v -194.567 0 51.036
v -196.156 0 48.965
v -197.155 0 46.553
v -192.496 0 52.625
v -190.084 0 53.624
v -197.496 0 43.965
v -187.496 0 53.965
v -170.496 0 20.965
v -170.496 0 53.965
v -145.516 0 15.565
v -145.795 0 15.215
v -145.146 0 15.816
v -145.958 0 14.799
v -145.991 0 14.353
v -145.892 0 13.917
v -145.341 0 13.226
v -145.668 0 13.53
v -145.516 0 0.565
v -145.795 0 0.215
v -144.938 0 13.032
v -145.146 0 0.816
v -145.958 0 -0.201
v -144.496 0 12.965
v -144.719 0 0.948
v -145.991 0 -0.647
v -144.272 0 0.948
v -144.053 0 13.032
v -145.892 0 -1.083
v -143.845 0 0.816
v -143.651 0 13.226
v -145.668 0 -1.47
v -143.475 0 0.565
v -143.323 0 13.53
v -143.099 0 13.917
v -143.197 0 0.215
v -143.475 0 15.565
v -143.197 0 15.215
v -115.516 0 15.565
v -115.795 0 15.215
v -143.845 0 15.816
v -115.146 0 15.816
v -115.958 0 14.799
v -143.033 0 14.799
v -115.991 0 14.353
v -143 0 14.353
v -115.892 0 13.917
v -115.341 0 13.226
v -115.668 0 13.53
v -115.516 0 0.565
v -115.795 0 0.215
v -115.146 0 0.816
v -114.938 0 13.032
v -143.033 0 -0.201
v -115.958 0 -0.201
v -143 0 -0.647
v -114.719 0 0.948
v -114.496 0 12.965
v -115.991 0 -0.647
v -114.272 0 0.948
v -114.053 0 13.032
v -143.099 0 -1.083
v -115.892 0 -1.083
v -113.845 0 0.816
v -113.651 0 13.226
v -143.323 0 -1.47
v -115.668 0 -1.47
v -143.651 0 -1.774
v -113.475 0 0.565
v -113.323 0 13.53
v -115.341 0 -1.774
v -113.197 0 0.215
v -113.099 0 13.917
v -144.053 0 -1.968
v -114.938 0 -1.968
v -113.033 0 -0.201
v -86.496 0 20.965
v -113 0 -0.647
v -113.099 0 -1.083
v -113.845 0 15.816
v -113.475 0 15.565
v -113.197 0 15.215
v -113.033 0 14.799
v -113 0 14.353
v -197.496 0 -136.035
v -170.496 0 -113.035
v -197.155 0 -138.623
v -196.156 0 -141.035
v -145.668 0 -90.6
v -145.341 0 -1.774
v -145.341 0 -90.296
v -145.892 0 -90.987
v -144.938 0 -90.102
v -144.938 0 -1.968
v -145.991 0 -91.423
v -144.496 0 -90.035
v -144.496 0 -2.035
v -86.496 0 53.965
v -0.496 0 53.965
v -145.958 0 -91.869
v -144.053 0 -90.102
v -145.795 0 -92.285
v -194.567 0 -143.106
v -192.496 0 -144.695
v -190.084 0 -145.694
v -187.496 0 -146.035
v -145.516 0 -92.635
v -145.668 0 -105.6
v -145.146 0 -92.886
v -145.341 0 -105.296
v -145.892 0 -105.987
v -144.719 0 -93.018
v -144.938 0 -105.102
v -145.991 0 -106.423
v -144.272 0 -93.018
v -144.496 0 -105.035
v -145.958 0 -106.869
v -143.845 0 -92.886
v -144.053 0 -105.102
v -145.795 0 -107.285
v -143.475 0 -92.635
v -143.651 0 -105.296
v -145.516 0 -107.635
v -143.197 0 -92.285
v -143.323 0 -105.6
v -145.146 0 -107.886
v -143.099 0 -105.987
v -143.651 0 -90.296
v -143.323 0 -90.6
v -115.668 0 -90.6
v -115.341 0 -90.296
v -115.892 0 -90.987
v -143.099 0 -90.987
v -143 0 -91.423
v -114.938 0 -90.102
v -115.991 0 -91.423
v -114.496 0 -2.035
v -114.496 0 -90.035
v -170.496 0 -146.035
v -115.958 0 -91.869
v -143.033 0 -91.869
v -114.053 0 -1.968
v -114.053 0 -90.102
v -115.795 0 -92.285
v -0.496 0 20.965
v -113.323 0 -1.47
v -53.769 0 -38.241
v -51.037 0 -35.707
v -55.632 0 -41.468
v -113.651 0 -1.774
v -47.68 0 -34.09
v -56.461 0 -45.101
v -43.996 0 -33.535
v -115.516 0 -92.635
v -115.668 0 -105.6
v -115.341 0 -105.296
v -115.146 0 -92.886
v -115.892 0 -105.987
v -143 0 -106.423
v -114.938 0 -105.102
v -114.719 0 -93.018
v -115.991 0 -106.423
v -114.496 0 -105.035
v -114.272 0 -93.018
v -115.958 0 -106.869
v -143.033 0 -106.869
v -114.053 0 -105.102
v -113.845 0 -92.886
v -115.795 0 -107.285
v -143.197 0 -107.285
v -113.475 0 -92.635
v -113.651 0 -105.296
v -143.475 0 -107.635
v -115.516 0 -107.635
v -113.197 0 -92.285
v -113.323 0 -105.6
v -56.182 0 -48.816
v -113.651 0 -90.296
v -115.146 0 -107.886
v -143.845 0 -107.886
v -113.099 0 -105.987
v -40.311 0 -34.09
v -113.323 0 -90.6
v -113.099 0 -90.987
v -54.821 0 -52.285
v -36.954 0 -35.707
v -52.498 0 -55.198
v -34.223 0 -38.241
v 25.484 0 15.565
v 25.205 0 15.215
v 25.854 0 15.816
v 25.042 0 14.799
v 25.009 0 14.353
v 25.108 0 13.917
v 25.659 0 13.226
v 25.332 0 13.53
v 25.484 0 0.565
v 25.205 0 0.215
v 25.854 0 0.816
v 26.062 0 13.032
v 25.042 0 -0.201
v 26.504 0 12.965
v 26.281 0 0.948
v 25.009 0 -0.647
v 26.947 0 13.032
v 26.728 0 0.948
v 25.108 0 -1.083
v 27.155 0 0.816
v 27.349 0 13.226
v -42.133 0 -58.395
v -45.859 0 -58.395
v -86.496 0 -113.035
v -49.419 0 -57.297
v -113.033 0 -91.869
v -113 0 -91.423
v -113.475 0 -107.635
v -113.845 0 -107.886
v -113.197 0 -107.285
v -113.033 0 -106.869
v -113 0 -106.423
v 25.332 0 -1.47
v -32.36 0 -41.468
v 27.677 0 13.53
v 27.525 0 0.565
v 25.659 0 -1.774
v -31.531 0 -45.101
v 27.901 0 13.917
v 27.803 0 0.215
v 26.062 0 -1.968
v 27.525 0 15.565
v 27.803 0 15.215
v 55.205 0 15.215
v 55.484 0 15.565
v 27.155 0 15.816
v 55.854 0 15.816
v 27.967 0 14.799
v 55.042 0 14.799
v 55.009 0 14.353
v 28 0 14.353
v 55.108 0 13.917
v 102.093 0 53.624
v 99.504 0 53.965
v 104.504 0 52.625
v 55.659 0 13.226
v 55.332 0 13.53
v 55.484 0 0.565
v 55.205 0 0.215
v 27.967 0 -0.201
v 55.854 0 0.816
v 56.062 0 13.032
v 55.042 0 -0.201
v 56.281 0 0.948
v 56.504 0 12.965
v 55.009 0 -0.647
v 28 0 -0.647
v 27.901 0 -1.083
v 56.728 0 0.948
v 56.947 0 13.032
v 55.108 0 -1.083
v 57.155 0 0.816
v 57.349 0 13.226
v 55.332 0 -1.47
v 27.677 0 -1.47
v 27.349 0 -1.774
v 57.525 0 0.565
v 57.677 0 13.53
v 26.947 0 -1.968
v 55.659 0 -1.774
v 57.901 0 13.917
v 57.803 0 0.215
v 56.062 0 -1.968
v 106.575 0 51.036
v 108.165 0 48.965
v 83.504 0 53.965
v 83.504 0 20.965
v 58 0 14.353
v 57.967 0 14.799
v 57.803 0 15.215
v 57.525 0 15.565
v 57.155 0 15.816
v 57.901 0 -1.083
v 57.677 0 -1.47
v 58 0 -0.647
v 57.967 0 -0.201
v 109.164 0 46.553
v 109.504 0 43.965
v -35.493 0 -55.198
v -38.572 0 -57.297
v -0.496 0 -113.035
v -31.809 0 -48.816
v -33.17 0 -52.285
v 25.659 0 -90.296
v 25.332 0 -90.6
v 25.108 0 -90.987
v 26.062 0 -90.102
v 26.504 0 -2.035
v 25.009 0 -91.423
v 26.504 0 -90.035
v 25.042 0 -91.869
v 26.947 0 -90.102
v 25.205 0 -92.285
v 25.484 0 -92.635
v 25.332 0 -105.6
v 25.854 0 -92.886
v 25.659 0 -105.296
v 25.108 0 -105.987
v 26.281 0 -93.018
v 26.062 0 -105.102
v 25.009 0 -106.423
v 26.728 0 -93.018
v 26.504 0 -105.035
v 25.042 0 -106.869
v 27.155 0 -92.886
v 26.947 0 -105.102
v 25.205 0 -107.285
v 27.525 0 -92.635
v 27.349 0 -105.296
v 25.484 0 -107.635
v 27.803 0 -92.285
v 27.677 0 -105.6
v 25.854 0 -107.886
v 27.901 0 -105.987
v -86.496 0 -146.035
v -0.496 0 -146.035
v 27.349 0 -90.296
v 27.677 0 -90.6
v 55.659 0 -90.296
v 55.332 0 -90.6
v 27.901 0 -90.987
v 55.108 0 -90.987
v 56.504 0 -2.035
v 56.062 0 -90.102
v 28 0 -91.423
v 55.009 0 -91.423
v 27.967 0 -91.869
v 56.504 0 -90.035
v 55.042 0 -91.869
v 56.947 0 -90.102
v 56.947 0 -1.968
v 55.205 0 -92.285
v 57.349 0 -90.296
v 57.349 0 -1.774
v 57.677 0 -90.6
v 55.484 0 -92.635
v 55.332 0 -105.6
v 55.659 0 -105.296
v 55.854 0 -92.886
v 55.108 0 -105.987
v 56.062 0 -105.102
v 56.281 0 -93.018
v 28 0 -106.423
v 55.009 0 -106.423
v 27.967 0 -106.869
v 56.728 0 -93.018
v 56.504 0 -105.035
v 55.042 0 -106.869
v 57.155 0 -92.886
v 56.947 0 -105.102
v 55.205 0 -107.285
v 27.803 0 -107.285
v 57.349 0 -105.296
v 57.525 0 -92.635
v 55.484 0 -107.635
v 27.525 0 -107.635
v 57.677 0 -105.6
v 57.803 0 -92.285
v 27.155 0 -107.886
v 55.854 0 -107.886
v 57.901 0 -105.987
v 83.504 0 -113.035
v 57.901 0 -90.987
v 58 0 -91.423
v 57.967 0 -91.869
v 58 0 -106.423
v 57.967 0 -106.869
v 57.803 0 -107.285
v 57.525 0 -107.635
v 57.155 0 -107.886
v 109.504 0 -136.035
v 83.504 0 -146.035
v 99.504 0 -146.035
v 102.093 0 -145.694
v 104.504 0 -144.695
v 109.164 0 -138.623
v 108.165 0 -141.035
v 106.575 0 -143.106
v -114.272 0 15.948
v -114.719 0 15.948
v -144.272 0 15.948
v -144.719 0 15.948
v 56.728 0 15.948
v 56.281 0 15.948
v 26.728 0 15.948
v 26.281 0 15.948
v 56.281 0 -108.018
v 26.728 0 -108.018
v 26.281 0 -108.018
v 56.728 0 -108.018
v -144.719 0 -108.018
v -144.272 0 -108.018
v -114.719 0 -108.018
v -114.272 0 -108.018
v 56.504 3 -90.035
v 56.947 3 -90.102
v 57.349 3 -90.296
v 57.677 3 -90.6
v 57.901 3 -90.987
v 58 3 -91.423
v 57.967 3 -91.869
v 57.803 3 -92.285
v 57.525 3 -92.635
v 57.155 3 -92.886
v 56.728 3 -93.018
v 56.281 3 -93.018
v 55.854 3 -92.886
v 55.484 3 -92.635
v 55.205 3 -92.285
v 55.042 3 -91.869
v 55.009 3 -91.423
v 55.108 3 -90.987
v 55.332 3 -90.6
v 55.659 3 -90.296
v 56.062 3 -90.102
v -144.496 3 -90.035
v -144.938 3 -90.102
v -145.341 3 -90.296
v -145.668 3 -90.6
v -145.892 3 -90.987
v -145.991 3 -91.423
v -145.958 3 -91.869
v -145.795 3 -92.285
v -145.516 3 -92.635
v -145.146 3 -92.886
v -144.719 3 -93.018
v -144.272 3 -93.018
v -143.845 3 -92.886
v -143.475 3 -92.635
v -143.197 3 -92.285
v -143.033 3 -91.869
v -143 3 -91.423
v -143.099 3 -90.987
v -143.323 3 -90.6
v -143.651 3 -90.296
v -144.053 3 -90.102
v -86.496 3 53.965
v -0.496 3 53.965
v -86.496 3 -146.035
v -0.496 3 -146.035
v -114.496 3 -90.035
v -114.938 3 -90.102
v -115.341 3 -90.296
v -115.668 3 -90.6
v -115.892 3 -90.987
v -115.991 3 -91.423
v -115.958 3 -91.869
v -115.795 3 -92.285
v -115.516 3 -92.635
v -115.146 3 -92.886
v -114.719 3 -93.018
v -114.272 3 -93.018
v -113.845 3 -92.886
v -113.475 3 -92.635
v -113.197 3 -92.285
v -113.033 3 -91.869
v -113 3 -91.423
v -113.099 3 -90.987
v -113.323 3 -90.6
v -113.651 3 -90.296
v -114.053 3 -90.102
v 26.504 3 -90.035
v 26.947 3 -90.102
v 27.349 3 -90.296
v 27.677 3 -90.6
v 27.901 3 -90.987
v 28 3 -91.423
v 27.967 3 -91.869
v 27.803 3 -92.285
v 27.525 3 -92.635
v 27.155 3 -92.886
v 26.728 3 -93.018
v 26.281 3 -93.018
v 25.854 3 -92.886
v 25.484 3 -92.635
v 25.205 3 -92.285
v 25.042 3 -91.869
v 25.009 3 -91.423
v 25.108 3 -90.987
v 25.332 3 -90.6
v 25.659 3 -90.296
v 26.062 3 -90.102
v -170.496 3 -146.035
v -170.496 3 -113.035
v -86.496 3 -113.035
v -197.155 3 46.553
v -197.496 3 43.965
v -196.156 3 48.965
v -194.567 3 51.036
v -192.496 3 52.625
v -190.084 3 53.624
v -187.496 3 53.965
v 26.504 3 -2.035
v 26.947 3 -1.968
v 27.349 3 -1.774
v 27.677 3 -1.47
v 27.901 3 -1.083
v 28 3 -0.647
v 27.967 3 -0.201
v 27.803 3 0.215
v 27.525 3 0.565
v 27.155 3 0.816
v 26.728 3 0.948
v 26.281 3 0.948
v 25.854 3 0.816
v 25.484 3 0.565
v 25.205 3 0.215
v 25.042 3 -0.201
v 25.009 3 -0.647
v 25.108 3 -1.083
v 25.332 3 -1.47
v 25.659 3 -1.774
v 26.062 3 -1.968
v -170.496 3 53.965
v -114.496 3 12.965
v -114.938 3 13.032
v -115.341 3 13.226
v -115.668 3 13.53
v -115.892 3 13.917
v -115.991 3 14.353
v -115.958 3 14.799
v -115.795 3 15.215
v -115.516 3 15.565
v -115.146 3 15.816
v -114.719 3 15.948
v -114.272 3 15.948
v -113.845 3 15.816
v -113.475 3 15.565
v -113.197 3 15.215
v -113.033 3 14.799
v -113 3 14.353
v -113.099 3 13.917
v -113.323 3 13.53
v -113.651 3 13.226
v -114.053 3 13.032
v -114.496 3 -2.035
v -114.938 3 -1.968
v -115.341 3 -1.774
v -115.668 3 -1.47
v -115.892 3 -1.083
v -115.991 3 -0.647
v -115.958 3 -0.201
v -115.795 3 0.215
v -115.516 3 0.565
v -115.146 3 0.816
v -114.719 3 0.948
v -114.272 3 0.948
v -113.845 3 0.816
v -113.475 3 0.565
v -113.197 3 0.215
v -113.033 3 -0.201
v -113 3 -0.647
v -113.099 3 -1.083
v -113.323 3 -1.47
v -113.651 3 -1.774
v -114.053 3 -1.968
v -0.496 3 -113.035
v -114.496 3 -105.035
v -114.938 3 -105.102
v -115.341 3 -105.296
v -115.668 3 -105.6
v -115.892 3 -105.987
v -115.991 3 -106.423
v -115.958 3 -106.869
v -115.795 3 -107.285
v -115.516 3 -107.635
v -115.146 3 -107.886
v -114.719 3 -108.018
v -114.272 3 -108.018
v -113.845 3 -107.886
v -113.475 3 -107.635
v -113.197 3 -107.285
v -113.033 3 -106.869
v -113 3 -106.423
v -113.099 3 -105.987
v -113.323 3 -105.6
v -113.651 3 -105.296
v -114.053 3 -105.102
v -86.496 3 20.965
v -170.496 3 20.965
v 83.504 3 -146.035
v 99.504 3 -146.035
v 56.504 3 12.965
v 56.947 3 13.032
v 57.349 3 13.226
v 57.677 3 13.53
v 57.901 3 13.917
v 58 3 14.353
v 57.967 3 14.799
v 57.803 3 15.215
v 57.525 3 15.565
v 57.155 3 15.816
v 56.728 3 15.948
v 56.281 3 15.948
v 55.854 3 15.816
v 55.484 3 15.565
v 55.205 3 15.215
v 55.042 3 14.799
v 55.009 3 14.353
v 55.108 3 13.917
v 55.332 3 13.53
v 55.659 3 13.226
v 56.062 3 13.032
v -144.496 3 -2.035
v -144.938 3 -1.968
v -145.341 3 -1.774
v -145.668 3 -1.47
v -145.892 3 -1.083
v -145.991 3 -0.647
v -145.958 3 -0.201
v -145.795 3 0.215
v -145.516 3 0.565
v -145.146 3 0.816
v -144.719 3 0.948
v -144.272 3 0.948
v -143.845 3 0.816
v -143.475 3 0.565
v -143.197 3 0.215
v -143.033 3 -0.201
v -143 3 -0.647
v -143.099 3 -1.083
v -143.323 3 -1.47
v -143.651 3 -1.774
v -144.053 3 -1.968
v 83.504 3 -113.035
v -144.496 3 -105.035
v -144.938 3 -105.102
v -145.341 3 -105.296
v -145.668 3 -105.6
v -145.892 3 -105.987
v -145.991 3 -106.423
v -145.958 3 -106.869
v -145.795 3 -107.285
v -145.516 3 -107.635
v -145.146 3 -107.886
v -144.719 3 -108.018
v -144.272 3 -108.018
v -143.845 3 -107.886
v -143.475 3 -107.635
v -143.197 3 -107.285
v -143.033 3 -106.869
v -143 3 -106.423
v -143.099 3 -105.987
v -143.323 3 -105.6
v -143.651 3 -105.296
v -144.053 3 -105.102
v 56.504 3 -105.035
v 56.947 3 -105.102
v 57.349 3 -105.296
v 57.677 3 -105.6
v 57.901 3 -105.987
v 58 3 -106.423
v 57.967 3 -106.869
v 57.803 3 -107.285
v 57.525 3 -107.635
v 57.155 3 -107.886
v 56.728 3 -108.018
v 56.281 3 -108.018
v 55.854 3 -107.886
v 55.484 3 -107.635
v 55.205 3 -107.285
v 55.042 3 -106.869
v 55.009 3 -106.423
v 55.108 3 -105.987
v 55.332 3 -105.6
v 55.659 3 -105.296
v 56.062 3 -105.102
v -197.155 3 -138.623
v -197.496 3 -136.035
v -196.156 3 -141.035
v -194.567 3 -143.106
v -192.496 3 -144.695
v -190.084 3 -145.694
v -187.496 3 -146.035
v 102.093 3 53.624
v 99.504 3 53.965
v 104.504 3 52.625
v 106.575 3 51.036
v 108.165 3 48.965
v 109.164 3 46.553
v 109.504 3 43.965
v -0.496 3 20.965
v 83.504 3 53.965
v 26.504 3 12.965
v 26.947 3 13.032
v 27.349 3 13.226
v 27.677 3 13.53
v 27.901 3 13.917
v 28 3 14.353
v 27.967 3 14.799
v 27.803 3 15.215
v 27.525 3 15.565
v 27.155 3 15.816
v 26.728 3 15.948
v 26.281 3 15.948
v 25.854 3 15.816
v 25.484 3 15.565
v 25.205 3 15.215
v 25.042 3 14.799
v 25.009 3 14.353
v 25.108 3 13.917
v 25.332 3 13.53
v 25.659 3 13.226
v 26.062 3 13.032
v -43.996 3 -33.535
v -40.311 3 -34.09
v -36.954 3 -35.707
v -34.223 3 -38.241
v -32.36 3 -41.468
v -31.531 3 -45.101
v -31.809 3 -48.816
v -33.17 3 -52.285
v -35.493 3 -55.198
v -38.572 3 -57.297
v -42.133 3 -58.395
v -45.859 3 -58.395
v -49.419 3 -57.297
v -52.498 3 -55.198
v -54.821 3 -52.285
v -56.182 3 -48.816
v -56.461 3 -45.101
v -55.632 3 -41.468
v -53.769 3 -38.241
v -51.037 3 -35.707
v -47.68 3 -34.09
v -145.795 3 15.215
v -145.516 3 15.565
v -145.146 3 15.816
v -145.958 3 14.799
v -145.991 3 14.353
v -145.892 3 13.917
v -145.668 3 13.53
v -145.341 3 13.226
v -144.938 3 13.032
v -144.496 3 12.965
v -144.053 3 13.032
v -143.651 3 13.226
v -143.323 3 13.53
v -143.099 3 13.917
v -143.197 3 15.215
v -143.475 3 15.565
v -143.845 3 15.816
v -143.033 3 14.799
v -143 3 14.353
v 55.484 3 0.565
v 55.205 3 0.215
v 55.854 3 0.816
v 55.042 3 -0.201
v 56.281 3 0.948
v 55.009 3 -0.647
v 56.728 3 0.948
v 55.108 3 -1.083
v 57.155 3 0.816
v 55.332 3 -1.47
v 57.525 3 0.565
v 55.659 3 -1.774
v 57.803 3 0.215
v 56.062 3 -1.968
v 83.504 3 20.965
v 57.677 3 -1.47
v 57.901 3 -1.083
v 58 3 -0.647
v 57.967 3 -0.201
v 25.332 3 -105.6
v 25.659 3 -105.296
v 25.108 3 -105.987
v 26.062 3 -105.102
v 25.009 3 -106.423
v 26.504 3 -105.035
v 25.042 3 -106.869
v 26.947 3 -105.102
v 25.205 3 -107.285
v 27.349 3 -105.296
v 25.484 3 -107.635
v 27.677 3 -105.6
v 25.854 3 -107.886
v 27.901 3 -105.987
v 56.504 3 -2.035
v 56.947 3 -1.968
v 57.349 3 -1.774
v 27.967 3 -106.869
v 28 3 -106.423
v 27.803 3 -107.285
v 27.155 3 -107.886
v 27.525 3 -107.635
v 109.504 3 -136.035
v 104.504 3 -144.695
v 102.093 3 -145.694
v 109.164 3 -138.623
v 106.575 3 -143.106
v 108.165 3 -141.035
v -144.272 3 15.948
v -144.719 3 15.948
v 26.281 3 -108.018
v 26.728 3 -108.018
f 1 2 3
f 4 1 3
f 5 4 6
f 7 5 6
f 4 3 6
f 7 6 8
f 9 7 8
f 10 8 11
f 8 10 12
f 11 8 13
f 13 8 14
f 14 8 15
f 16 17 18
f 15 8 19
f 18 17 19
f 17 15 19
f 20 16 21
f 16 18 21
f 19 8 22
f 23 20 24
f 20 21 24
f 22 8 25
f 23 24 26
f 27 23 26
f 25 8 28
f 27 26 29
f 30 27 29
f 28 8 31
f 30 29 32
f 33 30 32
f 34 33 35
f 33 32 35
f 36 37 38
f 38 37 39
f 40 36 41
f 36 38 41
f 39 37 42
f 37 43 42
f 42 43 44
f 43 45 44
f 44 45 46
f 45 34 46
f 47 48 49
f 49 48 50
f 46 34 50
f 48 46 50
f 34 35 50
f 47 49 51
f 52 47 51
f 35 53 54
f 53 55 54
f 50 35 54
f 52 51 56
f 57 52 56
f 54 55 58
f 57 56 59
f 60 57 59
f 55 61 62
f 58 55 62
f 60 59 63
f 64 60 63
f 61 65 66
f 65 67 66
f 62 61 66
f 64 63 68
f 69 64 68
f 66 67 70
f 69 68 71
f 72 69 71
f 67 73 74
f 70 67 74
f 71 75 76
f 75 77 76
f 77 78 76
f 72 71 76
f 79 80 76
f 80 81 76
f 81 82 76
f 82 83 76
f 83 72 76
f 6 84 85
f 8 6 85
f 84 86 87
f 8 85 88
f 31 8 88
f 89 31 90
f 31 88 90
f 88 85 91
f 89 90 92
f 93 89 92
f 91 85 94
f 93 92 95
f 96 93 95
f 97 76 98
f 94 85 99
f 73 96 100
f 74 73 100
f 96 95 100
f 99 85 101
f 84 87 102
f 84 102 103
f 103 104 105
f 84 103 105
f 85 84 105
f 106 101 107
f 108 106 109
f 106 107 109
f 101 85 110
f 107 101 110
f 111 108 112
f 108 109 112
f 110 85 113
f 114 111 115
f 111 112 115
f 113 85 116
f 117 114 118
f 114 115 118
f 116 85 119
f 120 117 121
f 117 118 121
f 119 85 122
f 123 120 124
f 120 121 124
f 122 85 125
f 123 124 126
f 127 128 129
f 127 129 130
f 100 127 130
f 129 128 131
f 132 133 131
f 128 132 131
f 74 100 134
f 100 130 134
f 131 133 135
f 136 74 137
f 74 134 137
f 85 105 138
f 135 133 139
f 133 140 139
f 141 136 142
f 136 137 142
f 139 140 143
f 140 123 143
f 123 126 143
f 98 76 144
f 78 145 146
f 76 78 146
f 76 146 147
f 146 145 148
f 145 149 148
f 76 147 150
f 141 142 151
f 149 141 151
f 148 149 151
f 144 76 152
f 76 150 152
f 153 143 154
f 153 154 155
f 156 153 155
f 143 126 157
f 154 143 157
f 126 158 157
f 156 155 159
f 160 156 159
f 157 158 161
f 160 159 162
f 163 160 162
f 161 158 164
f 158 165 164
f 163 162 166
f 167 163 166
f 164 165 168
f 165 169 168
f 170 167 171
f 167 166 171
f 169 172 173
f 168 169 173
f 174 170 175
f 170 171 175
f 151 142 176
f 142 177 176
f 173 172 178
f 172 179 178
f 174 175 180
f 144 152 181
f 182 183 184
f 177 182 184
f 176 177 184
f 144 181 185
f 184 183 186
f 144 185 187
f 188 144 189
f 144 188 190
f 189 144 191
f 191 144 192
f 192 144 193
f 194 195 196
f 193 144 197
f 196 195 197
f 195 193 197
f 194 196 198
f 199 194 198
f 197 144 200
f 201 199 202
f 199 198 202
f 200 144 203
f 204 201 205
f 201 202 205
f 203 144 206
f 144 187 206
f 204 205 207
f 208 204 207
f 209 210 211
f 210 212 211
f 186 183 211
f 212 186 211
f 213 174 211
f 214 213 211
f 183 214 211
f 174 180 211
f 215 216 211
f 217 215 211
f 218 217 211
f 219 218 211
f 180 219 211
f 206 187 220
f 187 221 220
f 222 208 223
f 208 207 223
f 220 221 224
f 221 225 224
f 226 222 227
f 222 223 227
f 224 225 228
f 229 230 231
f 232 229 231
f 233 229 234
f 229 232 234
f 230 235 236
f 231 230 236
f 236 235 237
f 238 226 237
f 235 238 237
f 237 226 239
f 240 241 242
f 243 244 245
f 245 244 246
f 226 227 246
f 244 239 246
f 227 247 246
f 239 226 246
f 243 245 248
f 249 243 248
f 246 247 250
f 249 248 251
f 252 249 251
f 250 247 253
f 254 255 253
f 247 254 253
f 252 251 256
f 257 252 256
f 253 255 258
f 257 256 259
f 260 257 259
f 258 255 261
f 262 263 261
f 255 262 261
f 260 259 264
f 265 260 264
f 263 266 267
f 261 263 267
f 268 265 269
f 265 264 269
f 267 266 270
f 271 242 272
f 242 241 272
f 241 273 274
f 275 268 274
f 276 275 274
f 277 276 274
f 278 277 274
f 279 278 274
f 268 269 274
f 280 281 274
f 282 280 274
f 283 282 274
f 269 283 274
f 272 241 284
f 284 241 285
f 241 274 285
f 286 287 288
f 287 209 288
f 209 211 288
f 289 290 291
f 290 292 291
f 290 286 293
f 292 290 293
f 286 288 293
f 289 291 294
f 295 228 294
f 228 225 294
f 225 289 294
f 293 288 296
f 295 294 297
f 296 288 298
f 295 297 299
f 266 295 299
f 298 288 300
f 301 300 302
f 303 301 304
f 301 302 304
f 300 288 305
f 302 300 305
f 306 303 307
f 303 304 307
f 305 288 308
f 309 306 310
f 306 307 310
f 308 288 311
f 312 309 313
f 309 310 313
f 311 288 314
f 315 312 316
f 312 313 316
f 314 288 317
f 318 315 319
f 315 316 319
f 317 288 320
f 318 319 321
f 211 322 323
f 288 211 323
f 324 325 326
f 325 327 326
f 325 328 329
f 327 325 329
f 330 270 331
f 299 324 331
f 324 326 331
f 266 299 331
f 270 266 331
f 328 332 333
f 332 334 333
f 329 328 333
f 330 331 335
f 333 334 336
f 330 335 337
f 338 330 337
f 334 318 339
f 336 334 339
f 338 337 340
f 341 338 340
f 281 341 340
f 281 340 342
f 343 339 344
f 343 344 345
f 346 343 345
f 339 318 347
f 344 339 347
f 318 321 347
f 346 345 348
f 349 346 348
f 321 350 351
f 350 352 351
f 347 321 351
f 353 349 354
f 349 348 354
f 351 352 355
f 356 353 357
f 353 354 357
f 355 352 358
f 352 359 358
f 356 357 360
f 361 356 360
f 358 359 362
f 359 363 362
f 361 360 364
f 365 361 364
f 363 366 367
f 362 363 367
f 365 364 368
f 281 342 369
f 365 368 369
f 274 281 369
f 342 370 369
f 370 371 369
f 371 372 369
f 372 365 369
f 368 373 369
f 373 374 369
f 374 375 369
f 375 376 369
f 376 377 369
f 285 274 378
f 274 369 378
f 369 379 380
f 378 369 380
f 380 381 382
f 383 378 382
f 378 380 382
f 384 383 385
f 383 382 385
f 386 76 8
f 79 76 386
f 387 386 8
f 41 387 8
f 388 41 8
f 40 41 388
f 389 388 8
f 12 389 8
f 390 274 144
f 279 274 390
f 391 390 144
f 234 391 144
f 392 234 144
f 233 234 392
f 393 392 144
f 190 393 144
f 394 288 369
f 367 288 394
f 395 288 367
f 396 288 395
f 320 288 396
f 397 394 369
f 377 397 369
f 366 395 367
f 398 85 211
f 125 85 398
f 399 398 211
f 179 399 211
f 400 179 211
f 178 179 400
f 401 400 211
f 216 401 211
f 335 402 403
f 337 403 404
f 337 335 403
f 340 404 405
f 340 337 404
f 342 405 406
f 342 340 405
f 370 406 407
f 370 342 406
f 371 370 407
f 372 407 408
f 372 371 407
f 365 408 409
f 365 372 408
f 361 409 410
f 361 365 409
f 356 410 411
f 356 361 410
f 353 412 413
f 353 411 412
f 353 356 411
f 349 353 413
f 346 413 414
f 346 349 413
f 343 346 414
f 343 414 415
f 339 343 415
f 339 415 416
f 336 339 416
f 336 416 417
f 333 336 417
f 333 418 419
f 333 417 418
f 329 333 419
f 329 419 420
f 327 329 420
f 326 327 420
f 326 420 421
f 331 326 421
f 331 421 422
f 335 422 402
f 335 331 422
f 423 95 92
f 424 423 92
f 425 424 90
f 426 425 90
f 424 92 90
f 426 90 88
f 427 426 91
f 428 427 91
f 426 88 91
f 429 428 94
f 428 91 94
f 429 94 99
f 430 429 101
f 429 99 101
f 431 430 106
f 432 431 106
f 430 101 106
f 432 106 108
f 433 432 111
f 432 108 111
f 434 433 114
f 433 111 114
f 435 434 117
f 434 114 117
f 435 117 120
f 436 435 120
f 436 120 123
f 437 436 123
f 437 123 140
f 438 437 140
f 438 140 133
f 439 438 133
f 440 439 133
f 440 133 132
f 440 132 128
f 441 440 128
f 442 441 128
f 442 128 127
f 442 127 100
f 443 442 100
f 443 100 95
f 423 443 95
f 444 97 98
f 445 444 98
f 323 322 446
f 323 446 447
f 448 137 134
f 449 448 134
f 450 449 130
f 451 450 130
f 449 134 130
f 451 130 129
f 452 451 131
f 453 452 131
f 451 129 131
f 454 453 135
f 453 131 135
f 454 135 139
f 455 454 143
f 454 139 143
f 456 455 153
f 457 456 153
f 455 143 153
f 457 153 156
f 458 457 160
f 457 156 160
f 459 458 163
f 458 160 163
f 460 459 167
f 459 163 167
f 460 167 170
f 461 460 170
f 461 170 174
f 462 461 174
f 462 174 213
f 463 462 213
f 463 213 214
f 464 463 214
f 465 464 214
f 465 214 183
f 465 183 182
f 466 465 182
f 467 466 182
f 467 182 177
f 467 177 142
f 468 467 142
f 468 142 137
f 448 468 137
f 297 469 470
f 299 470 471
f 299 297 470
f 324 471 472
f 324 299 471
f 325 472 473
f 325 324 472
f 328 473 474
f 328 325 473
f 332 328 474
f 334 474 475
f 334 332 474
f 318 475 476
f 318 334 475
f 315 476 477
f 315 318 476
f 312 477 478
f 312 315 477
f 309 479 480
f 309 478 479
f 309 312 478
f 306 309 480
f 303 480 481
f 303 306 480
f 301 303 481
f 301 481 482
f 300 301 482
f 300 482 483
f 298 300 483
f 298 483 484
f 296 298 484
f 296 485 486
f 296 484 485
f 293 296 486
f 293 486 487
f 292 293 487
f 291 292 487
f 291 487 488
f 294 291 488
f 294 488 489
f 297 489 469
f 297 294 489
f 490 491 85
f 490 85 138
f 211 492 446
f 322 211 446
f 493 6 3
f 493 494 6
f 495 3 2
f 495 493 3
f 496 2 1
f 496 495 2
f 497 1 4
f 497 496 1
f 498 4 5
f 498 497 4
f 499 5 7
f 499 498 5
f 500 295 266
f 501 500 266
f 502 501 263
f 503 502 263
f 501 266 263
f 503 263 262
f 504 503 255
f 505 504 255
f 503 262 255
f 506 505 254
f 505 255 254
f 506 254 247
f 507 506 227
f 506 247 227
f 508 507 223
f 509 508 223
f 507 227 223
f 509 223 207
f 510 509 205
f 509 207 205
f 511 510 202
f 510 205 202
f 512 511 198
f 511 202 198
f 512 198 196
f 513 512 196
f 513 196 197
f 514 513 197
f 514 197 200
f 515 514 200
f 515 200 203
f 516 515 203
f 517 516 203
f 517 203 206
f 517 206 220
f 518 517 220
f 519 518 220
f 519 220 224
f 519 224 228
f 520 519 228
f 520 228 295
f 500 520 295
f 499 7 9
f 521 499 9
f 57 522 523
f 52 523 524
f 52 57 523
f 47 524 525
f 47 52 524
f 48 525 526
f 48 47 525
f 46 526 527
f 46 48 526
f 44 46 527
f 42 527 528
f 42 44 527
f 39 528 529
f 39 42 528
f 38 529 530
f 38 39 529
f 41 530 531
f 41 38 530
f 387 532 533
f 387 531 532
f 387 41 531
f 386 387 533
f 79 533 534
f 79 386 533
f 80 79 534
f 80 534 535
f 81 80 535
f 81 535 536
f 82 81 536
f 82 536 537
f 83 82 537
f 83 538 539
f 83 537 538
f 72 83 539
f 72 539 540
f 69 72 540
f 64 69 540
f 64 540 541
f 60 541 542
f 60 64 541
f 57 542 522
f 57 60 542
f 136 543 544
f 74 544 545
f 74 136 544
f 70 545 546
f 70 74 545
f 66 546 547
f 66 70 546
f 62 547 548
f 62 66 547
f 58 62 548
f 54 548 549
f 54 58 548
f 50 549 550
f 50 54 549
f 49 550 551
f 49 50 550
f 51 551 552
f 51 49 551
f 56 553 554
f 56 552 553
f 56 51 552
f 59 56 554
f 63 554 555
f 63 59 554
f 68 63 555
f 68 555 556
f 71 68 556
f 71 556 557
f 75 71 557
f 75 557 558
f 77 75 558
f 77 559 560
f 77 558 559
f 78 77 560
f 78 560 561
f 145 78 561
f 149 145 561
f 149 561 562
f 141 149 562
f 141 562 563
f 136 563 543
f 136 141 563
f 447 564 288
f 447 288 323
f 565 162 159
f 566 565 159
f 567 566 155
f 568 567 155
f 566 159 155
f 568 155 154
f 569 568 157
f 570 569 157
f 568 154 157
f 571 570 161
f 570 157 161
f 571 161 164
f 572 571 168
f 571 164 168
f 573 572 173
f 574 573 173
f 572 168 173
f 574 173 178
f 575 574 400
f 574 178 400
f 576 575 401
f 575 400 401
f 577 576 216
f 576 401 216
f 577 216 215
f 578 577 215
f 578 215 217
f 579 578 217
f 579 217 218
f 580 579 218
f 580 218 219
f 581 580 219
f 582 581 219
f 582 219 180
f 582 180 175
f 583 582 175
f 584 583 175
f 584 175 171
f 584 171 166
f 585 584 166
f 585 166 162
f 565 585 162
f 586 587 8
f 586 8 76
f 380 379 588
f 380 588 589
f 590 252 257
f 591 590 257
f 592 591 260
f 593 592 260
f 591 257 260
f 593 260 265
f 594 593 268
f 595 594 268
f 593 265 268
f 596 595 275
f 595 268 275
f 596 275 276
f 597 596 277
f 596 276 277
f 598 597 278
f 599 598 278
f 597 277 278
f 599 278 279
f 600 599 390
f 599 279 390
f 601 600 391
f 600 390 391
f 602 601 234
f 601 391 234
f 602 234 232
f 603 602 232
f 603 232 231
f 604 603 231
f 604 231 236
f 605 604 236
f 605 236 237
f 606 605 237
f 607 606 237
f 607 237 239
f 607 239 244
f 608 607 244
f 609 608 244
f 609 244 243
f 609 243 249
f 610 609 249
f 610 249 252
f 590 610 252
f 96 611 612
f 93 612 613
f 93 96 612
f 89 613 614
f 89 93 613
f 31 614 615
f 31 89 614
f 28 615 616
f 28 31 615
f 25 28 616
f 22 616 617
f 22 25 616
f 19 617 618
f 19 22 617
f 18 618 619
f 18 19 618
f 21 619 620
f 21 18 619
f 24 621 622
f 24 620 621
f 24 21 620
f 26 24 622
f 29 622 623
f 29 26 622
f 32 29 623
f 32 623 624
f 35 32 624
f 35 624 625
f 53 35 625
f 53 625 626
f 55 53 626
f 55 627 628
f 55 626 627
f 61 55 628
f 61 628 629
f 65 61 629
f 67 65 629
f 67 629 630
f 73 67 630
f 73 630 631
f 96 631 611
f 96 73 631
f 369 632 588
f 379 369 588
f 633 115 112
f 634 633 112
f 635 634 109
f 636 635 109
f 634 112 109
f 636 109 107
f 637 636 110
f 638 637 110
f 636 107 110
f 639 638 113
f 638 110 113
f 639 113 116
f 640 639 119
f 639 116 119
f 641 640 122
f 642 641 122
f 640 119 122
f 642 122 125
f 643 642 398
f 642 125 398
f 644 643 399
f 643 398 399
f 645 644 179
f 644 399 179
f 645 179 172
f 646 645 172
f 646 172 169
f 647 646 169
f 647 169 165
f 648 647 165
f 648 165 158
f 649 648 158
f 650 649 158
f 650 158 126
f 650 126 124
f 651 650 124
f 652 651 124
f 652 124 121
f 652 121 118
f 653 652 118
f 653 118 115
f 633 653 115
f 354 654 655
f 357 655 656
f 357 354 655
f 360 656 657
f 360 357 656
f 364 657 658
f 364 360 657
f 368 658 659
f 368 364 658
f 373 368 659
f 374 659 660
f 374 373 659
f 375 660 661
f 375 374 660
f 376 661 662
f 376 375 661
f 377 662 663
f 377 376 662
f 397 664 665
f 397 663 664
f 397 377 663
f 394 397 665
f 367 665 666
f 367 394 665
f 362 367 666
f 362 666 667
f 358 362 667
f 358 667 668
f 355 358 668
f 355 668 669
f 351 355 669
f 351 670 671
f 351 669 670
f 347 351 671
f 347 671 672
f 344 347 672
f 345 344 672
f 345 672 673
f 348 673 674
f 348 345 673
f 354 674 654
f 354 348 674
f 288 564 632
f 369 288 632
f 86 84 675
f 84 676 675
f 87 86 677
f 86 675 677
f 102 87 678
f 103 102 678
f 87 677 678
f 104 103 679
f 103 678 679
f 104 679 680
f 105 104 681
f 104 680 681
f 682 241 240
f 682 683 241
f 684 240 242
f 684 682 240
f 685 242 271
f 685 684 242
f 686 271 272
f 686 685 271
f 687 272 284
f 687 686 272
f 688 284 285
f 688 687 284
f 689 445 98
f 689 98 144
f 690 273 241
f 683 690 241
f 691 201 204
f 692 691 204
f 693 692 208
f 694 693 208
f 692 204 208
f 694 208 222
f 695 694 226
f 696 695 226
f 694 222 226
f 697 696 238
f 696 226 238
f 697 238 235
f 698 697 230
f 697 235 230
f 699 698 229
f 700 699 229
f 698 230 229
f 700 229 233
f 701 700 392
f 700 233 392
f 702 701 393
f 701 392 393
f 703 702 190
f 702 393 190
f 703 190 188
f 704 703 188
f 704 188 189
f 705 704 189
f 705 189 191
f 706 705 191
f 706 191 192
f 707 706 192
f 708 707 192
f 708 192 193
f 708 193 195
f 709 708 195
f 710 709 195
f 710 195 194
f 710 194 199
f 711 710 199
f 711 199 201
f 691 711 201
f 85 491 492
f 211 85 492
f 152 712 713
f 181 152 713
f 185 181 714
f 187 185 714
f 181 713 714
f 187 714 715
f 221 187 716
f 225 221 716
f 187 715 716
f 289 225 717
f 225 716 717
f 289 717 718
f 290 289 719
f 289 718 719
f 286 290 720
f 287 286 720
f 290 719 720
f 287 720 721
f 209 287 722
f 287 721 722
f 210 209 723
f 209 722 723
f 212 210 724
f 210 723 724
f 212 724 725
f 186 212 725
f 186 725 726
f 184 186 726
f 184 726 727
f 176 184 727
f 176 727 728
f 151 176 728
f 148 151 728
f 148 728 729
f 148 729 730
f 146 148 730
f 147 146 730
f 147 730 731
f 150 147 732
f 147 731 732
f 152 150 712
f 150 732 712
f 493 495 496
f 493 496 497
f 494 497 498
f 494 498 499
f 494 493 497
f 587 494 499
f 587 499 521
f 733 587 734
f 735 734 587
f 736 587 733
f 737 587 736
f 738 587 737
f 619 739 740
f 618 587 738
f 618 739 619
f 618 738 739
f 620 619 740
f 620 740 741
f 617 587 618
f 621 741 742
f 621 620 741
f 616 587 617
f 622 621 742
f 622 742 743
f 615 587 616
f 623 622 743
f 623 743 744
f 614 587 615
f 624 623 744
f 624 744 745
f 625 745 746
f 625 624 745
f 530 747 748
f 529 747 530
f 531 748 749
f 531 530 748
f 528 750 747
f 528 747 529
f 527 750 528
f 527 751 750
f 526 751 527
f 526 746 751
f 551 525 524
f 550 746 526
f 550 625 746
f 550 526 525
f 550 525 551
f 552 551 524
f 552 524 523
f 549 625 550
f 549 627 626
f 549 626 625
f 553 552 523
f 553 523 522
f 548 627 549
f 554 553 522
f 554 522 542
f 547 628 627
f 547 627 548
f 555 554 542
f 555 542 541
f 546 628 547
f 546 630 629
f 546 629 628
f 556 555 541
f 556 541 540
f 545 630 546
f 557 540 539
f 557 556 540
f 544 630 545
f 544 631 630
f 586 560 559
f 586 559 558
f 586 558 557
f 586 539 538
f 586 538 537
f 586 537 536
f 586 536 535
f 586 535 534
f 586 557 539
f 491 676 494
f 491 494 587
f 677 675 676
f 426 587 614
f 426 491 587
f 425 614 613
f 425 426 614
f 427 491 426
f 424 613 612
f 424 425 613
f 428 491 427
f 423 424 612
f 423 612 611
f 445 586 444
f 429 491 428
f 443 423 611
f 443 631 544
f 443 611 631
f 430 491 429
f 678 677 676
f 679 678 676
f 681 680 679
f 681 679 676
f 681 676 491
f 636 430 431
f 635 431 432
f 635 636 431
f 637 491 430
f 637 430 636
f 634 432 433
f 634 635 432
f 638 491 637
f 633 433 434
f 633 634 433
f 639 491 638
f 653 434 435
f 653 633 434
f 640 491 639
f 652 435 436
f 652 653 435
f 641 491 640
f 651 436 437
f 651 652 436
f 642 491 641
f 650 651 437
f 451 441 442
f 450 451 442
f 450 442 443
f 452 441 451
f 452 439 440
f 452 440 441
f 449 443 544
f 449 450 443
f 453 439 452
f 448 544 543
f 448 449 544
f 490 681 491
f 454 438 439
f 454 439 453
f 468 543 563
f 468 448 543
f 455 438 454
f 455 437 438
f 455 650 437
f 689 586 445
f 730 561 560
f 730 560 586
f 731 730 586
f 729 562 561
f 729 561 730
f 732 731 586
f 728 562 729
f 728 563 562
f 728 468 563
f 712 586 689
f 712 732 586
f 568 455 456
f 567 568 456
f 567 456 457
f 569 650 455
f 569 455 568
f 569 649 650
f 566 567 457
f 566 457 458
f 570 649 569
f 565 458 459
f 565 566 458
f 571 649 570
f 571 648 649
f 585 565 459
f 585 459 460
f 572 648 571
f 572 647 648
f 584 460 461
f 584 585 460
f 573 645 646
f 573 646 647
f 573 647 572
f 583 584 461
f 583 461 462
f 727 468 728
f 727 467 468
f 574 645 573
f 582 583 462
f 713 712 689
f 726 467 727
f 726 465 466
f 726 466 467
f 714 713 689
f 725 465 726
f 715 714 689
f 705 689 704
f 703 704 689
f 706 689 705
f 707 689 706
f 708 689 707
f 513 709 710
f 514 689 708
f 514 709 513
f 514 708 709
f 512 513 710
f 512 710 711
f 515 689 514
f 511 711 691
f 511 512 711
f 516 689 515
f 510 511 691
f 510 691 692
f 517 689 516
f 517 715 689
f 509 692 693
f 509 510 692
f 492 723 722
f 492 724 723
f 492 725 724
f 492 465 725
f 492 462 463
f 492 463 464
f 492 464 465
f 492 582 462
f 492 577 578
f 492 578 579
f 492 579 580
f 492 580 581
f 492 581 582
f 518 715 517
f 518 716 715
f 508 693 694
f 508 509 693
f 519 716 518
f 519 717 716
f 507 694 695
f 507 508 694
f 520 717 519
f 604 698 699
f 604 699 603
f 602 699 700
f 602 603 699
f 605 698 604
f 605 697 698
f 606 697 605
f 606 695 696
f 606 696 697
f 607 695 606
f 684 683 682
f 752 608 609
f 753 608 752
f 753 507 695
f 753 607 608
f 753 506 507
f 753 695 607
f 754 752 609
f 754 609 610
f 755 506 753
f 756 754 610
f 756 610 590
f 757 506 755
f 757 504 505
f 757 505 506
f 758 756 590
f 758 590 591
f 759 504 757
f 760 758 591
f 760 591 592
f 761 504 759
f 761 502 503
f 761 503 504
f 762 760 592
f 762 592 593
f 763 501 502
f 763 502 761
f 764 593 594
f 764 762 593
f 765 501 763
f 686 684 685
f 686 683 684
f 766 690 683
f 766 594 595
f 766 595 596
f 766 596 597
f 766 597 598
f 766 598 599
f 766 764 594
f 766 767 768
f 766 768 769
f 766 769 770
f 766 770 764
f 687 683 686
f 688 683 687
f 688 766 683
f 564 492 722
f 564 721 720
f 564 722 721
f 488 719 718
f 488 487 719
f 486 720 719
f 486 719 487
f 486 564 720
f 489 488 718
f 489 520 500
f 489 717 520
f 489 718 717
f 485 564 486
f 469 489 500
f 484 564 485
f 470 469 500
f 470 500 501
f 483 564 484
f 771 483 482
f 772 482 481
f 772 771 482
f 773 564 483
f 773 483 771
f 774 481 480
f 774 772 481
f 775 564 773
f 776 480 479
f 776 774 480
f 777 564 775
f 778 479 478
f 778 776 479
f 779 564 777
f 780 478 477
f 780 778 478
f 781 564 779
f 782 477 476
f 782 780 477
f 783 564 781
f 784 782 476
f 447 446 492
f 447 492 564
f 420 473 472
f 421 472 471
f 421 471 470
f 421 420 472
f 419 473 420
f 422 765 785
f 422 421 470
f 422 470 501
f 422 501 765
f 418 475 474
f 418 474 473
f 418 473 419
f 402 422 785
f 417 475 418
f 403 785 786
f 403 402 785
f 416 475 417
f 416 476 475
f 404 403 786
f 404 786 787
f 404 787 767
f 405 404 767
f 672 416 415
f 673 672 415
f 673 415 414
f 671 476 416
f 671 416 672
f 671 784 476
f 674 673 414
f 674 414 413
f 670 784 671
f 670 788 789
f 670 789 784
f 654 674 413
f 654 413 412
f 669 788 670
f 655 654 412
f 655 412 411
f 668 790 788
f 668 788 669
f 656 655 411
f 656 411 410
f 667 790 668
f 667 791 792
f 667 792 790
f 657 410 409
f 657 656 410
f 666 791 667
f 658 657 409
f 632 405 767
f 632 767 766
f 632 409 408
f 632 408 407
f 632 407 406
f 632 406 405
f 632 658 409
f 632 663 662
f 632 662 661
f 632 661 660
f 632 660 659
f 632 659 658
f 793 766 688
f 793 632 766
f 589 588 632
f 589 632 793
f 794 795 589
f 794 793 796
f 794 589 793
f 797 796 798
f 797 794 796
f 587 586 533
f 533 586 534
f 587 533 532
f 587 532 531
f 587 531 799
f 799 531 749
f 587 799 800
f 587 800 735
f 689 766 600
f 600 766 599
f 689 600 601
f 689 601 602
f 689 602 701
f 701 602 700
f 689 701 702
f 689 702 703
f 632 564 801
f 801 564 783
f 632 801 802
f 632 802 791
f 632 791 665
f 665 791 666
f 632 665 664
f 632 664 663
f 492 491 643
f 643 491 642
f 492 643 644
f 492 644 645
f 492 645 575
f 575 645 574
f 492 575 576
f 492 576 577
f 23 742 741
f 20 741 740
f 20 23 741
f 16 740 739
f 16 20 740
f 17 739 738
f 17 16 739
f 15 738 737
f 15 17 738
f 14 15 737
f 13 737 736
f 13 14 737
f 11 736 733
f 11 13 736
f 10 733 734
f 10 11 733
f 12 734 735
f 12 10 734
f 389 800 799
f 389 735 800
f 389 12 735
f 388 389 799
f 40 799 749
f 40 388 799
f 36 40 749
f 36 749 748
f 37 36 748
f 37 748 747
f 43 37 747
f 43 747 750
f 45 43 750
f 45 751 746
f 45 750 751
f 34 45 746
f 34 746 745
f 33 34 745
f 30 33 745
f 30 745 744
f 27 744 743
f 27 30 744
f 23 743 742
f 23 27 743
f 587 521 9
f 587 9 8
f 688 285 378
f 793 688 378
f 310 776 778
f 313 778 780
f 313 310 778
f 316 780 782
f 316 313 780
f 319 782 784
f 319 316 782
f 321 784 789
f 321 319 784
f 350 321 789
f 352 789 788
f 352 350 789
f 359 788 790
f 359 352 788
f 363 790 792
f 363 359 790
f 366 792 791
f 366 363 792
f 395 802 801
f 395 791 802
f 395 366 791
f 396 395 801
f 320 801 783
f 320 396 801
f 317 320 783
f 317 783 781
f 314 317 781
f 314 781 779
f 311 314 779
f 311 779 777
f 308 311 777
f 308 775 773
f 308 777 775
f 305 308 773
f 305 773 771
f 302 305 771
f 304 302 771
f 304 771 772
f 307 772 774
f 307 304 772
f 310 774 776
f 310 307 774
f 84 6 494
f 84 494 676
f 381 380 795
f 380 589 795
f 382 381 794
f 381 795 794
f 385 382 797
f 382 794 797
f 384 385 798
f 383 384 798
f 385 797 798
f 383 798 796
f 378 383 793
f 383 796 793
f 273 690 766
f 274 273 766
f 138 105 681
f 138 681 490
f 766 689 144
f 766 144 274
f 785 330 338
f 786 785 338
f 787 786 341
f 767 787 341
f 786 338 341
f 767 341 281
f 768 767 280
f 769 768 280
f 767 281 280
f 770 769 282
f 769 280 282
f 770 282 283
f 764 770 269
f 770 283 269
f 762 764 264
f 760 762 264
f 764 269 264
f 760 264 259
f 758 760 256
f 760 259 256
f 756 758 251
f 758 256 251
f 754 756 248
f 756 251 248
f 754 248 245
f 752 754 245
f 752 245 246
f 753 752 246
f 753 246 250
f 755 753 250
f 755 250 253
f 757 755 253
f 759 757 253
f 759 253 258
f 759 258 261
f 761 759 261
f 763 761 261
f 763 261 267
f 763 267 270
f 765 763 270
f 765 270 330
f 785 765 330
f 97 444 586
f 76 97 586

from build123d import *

# Parameters (mm, degrees)
SKETCH_1_W                                 = 307
SKETCH_1_H                                 = 200
EXTRUDE_1_DEPTH                            = 3
SKETCH_2_W                                 = 84
SKETCH_2_H                                 = 33
CUT_EXTRUDE_1_DEPTH                        = 3
PATTERN_LINEAR_1_COUNT                     = 2
PATTERN_LINEAR_1_PITCH                     = 170
PATTERN_LINEAR_1_COUNT_DIR2                = 2
PATTERN_LINEAR_1_PITCH_DIR2                = 167
SKETCH_6_R                                 = 12.5
CUT_EXTRUDE_2_DEPTH                        = 3
FILLET_1_R                                 = 10
SKETCH_11_R                                = 1.5
CUT_EXTRUDE_3_DEPTH                        = 10
SKETCH_11_3_R                              = 1.5
CUT_EXTRUDE_4_DEPTH                        = 10
MIRROR_2_AT_THE_SECOND_PLANE_COPY_1_SKET_R = 1.5
MIRROR_2_AT_THE_SECOND_PLANE_COPY_1_DEPTH  = 10
MIRROR_2_AT_THE_SECOND_PLANE_COPY_2_SKET_R = 1.5
MIRROR_2_AT_THE_SECOND_PLANE_COPY_2_DEPTH  = 10


with BuildPart() as part:
    # 草图1 → 凸台-拉伸1 (new body)
    with BuildSketch(Plane(origin=(0, 0, 0), x_dir=(1, 0, 0), z_dir=(0, 1, 0))):
        with Locations((-43.995626822, 46.034985423)):
            Rectangle(SKETCH_1_W, SKETCH_1_H)
    extrude(amount=EXTRUDE_1_DEPTH)

    # 草图2 → 切除-拉伸1 (cut)
    with BuildSketch(Plane(origin=(0, 3, 0), x_dir=(1, 0, 0), z_dir=(0, 1, 0))):
        with Locations((-128.495626822, 129.534985423)):
            Rectangle(SKETCH_2_W, SKETCH_2_H)
    cut_extrude_1 = extrude(amount=-CUT_EXTRUDE_1_DEPTH, mode=Mode.SUBTRACT)

    # 阵列(线性)1: Cut-Extrude 1 2 × 2
    with Locations(*[(i * PATTERN_LINEAR_1_PITCH, 0, j * PATTERN_LINEAR_1_PITCH_DIR2) for i in range(PATTERN_LINEAR_1_COUNT) for j in range(PATTERN_LINEAR_1_COUNT_DIR2) if (i, j) != (0, 0)]):
        add(cut_extrude_1, mode=Mode.SUBTRACT)

    # 草图6 → 切除-拉伸2 (cut)
    with BuildSketch(Plane(origin=(0, 3, 0), x_dir=(1, 0, 0), z_dir=(0, 1, 0))):
        with Locations((-43.995626822, 46.034985423)):
            Circle(SKETCH_6_R)
    extrude(amount=-CUT_EXTRUDE_2_DEPTH, mode=Mode.SUBTRACT)

    # 圆角1
    fillet_1_edges = [part.edges().sort_by_distance(p)[0] for p in [
        (-197.495626822, 1.5, -146.034985423),
        (-197.495626822, 1.5, 53.965014577),
        (109.504373178, 1.5, 53.965014577),
        (109.504373178, 1.5, -146.034985423),
    ]]
    fillet(fillet_1_edges, radius=FILLET_1_R)

    # 草图11 → 切除-拉伸3 (cut)
    with BuildSketch(Plane.XZ):
        with Locations((26.504373178, 14.465014577)):
            Circle(SKETCH_11_R)
        with Locations((56.504373178, 14.465014577)):
            Circle(SKETCH_11_R)
    cut_extrude_3 = extrude(amount=-CUT_EXTRUDE_3_DEPTH, mode=Mode.SUBTRACT)

    # 草图11<3> → 切除-拉伸4 (cut)
    with BuildSketch(Plane.XZ):
        with Locations((26.504373178, 14.465014577)):
            Circle(SKETCH_11_3_R)
        with Locations((56.504373178, 14.465014577)):
            Circle(SKETCH_11_3_R)
        with Locations((56.504373178, -0.534985423)):
            Circle(SKETCH_11_3_R)
        with Locations((26.504373178, -0.534985423)):
            Circle(SKETCH_11_3_R)
    cut_extrude_4 = extrude(amount=-CUT_EXTRUDE_4_DEPTH, mode=Mode.SUBTRACT)

    # 镜向2: 切除-拉伸3, 切除-拉伸4 across plane
    add(cut_extrude_3.mirror(Plane(origin=(-43.995626822, 0, 0), x_dir=(0, 0, 1), z_dir=(1, 0, 0))), mode=Mode.SUBTRACT)
    add(cut_extrude_4.mirror(Plane(origin=(-43.995626822, 0, 0), x_dir=(0, 0, 1), z_dir=(1, 0, 0))), mode=Mode.SUBTRACT)

    # 镜向2 at the second plane: 切除-拉伸3, 切除-拉伸4 across plane
    add(cut_extrude_3.mirror(Plane(origin=(0, 0, -46.034985423), x_dir=(1, 0, 0), z_dir=(0, 0, -1))), mode=Mode.SUBTRACT)
    add(cut_extrude_4.mirror(Plane(origin=(0, 0, -46.034985423), x_dir=(1, 0, 0), z_dir=(0, 0, -1))), mode=Mode.SUBTRACT)

    # 镜向2 at the second plane copy 1 sket → 镜向2 at the second plane copy 1 (cut)
    with BuildSketch(Plane(origin=(-87.991253644, 0, -92.069970845), x_dir=(-1, 0, 0), z_dir=(0, -1, 0))):
        with Locations((26.504373178, 14.465014577)):
            Circle(MIRROR_2_AT_THE_SECOND_PLANE_COPY_1_SKET_R)
        with Locations((56.504373178, 14.465014577)):
            Circle(MIRROR_2_AT_THE_SECOND_PLANE_COPY_1_SKET_R)
    extrude(amount=-MIRROR_2_AT_THE_SECOND_PLANE_COPY_1_DEPTH, mode=Mode.SUBTRACT)

    # 镜向2 at the second plane copy 2 sket → 镜向2 at the second plane copy 2 (cut)
    with BuildSketch(Plane(origin=(-87.991253644, 0, -92.069970845), x_dir=(-1, 0, 0), z_dir=(0, -1, 0))):
        with Locations((26.504373178, 14.465014577)):
            Circle(MIRROR_2_AT_THE_SECOND_PLANE_COPY_2_SKET_R)
        with Locations((56.504373178, 14.465014577)):
            Circle(MIRROR_2_AT_THE_SECOND_PLANE_COPY_2_SKET_R)
        with Locations((56.504373178, -0.534985423)):
            Circle(MIRROR_2_AT_THE_SECOND_PLANE_COPY_2_SKET_R)
        with Locations((26.504373178, -0.534985423)):
            Circle(MIRROR_2_AT_THE_SECOND_PLANE_COPY_2_SKET_R)
    extrude(amount=-MIRROR_2_AT_THE_SECOND_PLANE_COPY_2_DEPTH, mode=Mode.SUBTRACT)


solid = part.part
